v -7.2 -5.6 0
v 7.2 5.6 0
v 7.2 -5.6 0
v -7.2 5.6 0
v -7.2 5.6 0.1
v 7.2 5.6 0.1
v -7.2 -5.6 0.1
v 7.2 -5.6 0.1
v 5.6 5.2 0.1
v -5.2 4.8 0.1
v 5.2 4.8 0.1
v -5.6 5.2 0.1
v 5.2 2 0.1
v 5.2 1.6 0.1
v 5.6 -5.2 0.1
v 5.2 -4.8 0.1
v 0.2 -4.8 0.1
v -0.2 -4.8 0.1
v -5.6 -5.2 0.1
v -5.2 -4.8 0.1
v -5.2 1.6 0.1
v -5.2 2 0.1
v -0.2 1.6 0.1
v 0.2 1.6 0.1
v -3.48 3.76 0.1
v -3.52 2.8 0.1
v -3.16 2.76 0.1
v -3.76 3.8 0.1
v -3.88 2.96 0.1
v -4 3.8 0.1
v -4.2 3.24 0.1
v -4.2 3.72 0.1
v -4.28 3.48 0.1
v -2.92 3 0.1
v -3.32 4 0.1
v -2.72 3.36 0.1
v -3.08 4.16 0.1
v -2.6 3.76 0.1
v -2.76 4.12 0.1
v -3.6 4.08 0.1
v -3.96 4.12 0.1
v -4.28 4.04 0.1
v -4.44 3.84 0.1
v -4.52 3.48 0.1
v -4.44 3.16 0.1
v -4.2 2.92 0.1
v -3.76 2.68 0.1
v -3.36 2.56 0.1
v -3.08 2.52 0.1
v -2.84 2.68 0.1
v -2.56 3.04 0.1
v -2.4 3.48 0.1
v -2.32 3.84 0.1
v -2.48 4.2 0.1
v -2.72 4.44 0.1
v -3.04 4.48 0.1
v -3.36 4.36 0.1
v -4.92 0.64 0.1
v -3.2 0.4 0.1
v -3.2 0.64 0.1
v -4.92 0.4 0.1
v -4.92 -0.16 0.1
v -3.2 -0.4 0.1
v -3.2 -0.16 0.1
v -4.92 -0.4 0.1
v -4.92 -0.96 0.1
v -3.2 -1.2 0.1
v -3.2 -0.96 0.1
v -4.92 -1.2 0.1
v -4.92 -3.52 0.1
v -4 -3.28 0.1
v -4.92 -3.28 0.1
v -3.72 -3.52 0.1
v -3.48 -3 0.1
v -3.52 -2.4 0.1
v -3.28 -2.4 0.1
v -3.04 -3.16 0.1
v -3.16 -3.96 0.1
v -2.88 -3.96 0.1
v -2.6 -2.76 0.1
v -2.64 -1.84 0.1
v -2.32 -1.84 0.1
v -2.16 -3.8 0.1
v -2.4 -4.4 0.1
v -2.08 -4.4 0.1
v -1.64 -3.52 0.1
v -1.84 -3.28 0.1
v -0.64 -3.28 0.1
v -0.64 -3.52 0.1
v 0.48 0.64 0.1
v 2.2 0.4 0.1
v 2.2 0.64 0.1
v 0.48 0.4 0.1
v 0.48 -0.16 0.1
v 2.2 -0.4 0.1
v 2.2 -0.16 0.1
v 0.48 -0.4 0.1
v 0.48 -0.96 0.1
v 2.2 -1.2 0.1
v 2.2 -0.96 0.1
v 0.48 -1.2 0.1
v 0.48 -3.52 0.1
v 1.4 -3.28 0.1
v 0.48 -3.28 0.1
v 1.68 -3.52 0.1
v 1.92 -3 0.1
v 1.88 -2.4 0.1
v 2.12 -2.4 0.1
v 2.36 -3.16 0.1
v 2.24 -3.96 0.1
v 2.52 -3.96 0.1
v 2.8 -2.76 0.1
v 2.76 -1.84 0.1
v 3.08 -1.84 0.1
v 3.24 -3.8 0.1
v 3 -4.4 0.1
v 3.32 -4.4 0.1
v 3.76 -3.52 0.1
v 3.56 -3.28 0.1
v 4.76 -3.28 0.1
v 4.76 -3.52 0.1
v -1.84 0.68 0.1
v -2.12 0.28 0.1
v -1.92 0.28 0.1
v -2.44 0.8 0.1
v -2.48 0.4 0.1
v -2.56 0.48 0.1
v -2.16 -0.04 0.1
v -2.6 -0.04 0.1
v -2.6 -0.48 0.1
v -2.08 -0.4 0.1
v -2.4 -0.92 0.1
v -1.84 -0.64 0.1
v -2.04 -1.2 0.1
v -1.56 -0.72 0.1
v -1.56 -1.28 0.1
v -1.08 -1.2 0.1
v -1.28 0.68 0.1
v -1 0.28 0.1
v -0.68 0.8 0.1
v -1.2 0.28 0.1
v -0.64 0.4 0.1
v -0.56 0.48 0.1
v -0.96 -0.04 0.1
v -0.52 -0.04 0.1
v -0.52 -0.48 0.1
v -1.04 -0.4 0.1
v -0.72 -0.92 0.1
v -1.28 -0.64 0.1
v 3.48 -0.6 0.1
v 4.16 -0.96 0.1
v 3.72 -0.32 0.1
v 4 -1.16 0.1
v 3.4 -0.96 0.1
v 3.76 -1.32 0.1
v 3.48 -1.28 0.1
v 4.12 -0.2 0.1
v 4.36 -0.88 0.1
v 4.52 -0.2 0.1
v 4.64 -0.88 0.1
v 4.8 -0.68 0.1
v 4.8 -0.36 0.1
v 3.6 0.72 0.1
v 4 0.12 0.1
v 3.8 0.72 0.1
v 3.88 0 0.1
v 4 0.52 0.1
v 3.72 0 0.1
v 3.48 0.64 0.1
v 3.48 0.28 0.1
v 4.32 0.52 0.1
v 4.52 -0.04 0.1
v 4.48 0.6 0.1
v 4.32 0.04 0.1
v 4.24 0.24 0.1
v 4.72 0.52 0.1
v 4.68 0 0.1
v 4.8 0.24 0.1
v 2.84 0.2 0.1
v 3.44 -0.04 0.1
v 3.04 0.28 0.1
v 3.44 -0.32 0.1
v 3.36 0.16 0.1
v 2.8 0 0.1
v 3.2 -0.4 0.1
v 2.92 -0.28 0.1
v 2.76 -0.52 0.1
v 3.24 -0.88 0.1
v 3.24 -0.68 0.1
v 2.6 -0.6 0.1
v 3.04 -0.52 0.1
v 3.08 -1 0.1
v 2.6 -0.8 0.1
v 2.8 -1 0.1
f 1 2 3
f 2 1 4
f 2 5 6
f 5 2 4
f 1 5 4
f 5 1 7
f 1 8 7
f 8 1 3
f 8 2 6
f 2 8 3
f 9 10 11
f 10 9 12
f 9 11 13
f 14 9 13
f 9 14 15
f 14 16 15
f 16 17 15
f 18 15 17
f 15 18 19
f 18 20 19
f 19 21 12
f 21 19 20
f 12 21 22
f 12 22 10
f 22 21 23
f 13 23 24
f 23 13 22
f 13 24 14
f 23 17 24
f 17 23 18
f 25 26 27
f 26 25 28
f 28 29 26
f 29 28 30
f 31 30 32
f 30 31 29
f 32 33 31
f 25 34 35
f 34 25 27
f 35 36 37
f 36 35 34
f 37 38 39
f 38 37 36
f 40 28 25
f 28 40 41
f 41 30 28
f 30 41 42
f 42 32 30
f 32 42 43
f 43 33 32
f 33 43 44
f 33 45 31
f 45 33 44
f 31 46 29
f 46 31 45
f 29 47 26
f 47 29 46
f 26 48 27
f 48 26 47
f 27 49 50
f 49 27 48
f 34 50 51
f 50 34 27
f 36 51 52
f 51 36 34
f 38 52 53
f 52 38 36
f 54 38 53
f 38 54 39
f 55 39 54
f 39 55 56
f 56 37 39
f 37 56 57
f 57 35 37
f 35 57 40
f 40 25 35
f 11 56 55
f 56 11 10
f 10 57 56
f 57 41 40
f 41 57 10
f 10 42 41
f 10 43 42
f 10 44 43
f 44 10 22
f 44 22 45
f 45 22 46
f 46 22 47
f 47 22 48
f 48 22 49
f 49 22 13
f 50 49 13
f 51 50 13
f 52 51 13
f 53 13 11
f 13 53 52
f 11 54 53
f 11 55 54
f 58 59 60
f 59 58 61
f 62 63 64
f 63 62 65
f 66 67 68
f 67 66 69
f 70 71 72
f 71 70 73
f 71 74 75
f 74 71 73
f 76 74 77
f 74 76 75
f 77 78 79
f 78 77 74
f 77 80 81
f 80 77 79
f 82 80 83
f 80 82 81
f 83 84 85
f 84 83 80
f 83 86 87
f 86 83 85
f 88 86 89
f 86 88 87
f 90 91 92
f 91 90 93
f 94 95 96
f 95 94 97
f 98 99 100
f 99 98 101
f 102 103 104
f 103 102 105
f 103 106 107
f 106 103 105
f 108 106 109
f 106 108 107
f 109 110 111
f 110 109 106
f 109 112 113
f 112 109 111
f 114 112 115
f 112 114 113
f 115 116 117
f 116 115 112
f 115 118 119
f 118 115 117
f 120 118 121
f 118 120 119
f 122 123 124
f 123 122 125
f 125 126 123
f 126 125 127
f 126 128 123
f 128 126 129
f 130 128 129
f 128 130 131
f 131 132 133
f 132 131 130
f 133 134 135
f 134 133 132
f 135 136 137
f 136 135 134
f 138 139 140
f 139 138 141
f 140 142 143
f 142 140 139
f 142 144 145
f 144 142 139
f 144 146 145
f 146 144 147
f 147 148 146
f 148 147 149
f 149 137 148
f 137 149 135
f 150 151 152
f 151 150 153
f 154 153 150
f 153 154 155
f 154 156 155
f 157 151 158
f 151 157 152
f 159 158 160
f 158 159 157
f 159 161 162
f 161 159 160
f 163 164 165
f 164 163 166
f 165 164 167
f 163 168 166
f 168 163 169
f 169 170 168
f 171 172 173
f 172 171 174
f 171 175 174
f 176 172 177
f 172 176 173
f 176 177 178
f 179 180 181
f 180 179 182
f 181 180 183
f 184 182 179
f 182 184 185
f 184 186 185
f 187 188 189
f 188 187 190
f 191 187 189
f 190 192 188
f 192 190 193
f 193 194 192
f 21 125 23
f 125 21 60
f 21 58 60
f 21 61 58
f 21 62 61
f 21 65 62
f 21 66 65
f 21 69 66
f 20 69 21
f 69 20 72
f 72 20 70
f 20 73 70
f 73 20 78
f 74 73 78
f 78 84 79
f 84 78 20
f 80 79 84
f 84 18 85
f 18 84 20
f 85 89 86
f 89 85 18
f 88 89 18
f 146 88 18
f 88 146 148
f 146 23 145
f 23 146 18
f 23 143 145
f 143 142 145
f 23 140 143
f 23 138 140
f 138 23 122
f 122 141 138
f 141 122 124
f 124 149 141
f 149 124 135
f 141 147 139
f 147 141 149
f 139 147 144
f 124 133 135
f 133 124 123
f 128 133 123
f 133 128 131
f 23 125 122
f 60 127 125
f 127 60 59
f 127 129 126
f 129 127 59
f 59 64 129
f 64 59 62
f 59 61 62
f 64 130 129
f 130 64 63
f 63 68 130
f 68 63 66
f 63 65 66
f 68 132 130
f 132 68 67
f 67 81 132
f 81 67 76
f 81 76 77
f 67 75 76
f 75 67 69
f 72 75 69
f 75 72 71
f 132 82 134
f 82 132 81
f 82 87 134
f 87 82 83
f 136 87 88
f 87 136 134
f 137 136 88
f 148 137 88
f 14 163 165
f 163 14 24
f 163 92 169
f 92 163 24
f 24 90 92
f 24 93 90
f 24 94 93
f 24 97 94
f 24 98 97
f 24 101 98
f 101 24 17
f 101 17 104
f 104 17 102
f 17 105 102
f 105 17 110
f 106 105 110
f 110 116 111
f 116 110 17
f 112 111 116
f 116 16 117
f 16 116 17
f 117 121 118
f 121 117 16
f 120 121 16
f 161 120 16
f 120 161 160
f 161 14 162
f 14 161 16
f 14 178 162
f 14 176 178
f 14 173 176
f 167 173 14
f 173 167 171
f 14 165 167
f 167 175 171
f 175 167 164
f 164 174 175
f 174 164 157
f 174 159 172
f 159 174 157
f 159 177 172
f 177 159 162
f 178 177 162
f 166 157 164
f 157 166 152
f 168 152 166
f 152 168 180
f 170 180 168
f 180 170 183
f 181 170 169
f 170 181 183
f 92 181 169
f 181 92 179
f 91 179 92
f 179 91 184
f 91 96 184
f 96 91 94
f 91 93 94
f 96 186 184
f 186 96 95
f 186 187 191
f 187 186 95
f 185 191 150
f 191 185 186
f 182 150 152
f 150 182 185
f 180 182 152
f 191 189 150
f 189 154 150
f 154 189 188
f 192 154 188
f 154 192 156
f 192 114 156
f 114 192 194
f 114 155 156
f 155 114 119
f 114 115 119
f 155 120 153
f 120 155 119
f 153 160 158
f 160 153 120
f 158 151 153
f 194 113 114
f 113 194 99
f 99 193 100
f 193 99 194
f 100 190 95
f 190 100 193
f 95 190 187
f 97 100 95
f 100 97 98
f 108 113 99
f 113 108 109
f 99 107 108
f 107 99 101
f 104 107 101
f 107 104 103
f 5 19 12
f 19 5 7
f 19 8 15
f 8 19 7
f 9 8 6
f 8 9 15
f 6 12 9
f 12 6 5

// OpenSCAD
// file: ../p/box5-12.scad
use <../lib.scad>
function ldraw_lib__box5_12() = [
// 0 Box with 5 Faces without Any Edges
// 0 Name: box5-12.dat
// 0 Author: Chris Dee [cwdee]
// 0 !LDRAW_ORG Primitive UPDATE 2009-02
// 0 !LICENSE Licensed under CC BY 4.0 : see CAreadme.txt
// 
// 0 BFC CERTIFY CCW
  [0,"BFC","CERTIFY"],
  [0,"BFC","CCW"],
// 
// 0 !HISTORY 2009-09-03 [PTadmin] Official Update 2009-02
// 
// 
// 4 16 1 1 1 1 1 -1 -1 1 -1 -1 1 1
  [4,16,1,1,1,1,1,-1,-1,1,-1,-1,1,1],
// 4 16 -1 0 1 1 0 1 1 1 1 -1 1 1
  [4,16,-1,0,1,1,0,1,1,1,1,-1,1,1],
// 4 16 -1 0 -1 -1 0 1 -1 1 1 -1 1 -1
  [4,16,-1,0,-1,-1,0,1,-1,1,1,-1,1,-1],
// 4 16 1 0 -1 -1 0 -1 -1 1 -1 1 1 -1
  [4,16,1,0,-1,-1,0,-1,-1,1,-1,1,1,-1],
// 4 16 1 0 1 1 0 -1 1 1 -1 1 1 1
  [4,16,1,0,1,1,0,-1,1,1,-1,1,1,1],
// 0
];
module ldraw_lib__box5_12(step=0, col=false, unit=2/5, alt=false, line=0.2, solid=!$preview)
    makepoly(ldraw_lib__box5_12(), step=step, col=col, unit=unit, alt=alt, line=line, solid=solid);
ldraw_lib__box5_12(line=0.2);
// main file
use <../lib.scad>
use <../p/box5-12.scad>
function ldraw_lib__4650852l() = [
// 0 Sticker  1.4 x  1.8 with Pink Heart, Yellow Horseshoe, Paw Print and White Heart Monitor Lines on Medium Azur Background
// 0 Name: 4650852l.dat
// 0 Author: Takeshi Takahashi [RainbowDolphin]
// 0 !LDRAW_ORG Part UPDATE 2024-08
// 0 !LICENSE Licensed under CC BY 4.0 : see CAreadme.txt
// 
// 0 BFC CERTIFY CCW
  [0,"BFC","CERTIFY"],
  [0,"BFC","CCW"],
// 
// 0 !KEYWORDS Set 3188, Vet
// 
// 0 !HISTORY 2024-09-30 [OrionP] Official Update 2024-08
// 
// 
// 1 16 0 -0.25 0 18 0 0 0 0.25 0 0 0 14 box5-12.dat
  [1,16,0,-0.25,0,18,0,0,0,0.25,0,0,0,14, ldraw_lib__box5_12()],
// 4 15 -14 -0.25 13 -13 -0.25 12 13 -0.25 12 14 -0.25 13
  [4,15,-14,-0.25,13,-13,-0.25,12,13,-0.25,12,14,-0.25,13],
// 3 15 14 -0.25 13 13 -0.25 12 13 -0.25 5
  [3,15,14,-0.25,13,13,-0.25,12,13,-0.25,5],
// 4 15 14 -0.25 13 13 -0.25 5 13 -0.25 4 14 -0.25 -13
  [4,15,14,-0.25,13,13,-0.25,5,13,-0.25,4,14,-0.25,-13],
// 3 15 13 -0.25 4 13 -0.25 -12 14 -0.25 -13
  [3,15,13,-0.25,4,13,-0.25,-12,14,-0.25,-13],
// 3 15 13 -0.25 -12 0.5 -0.25 -12 14 -0.25 -13
  [3,15,13,-0.25,-12,0.5,-0.25,-12,14,-0.25,-13],
// 4 15 14 -0.25 -13 0.5 -0.25 -12 -0.5 -0.25 -12 -14 -0.25 -13
  [4,15,14,-0.25,-13,0.5,-0.25,-12,-0.5,-0.25,-12,-14,-0.25,-13],
// 3 15 -0.5 -0.25 -12 -13 -0.25 -12 -14 -0.25 -13
  [3,15,-0.5,-0.25,-12,-13,-0.25,-12,-14,-0.25,-13],
// 4 15 -14 -0.25 13 -14 -0.25 -13 -13 -0.25 -12 -13 -0.25 4
  [4,15,-14,-0.25,13,-14,-0.25,-13,-13,-0.25,-12,-13,-0.25,4],
// 3 15 -14 -0.25 13 -13 -0.25 4 -13 -0.25 5
  [3,15,-14,-0.25,13,-13,-0.25,4,-13,-0.25,5],
// 3 15 -14 -0.25 13 -13 -0.25 5 -13 -0.25 12
  [3,15,-14,-0.25,13,-13,-0.25,5,-13,-0.25,12],
// 3 15 -13 -0.25 5 -13 -0.25 4 -0.5 -0.25 4
  [3,15,-13,-0.25,5,-13,-0.25,4,-0.5,-0.25,4],
// 4 15 -13 -0.25 5 -0.5 -0.25 4 0.5 -0.25 4 13 -0.25 5
  [4,15,-13,-0.25,5,-0.5,-0.25,4,0.5,-0.25,4,13,-0.25,5],
// 3 15 13 -0.25 5 0.5 -0.25 4 13 -0.25 4
  [3,15,13,-0.25,5,0.5,-0.25,4,13,-0.25,4],
// 4 15 0.5 -0.25 4 -0.5 -0.25 4 -0.5 -0.25 -12 0.5 -0.25 -12
  [4,15,0.5,-0.25,4,-0.5,-0.25,4,-0.5,-0.25,-12,0.5,-0.25,-12],
// 4 5 -7.9 -0.25 6.9 -8.7 -0.25 9.4 -9.4 -0.25 9.5 -8.8 -0.25 7
  [4,5,-7.9,-0.25,6.9,-8.7,-0.25,9.4,-9.4,-0.25,9.5,-8.8,-0.25,7],
// 4 5 -8.8 -0.25 7 -9.4 -0.25 9.5 -10 -0.25 9.5 -9.7 -0.25 7.4
  [4,5,-8.8,-0.25,7,-9.4,-0.25,9.5,-10,-0.25,9.5,-9.7,-0.25,7.4],
// 4 5 -9.7 -0.25 7.4 -10 -0.25 9.5 -10.5 -0.25 9.3 -10.5 -0.25 8.1
  [4,5,-9.7,-0.25,7.4,-10,-0.25,9.5,-10.5,-0.25,9.3,-10.5,-0.25,8.1],
// 3 5 -10.5 -0.25 9.3 -10.7 -0.25 8.7 -10.5 -0.25 8.1
  [3,5,-10.5,-0.25,9.3,-10.7,-0.25,8.7,-10.5,-0.25,8.1],
// 4 5 -8.7 -0.25 9.4 -7.9 -0.25 6.9 -7.3 -0.25 7.5 -8.3 -0.25 10
  [4,5,-8.7,-0.25,9.4,-7.9,-0.25,6.9,-7.3,-0.25,7.5,-8.3,-0.25,10],
// 4 5 -8.3 -0.25 10 -7.3 -0.25 7.5 -6.8 -0.25 8.4 -7.7 -0.25 10.4
  [4,5,-8.3,-0.25,10,-7.3,-0.25,7.5,-6.8,-0.25,8.4,-7.7,-0.25,10.4],
// 4 5 -7.7 -0.25 10.4 -6.8 -0.25 8.4 -6.5 -0.25 9.4 -6.9 -0.25 10.3
  [4,5,-7.7,-0.25,10.4,-6.8,-0.25,8.4,-6.5,-0.25,9.4,-6.9,-0.25,10.3],
// 4 15 -9.4 -0.25 9.5 -8.7 -0.25 9.4 -9 -0.25 10.2 -9.9 -0.25 10.3
  [4,15,-9.4,-0.25,9.5,-8.7,-0.25,9.4,-9,-0.25,10.2,-9.9,-0.25,10.3],
// 4 15 -10 -0.25 9.5 -9.4 -0.25 9.5 -9.9 -0.25 10.3 -10.7 -0.25 10.1
  [4,15,-10,-0.25,9.5,-9.4,-0.25,9.5,-9.9,-0.25,10.3,-10.7,-0.25,10.1],
// 4 15 -10.5 -0.25 9.3 -10 -0.25 9.5 -10.7 -0.25 10.1 -11.1 -0.25 9.6
  [4,15,-10.5,-0.25,9.3,-10,-0.25,9.5,-10.7,-0.25,10.1,-11.1,-0.25,9.6],
// 4 15 -10.7 -0.25 8.7 -10.5 -0.25 9.3 -11.1 -0.25 9.6 -11.3 -0.25 8.7
  [4,15,-10.7,-0.25,8.7,-10.5,-0.25,9.3,-11.1,-0.25,9.6,-11.3,-0.25,8.7],
// 4 15 -10.7 -0.25 8.7 -11.3 -0.25 8.7 -11.1 -0.25 7.9 -10.5 -0.25 8.1
  [4,15,-10.7,-0.25,8.7,-11.3,-0.25,8.7,-11.1,-0.25,7.9,-10.5,-0.25,8.1],
// 4 15 -10.5 -0.25 8.1 -11.1 -0.25 7.9 -10.5 -0.25 7.3 -9.7 -0.25 7.4
  [4,15,-10.5,-0.25,8.1,-11.1,-0.25,7.9,-10.5,-0.25,7.3,-9.7,-0.25,7.4],
// 4 15 -9.7 -0.25 7.4 -10.5 -0.25 7.3 -9.4 -0.25 6.7 -8.8 -0.25 7
  [4,15,-9.7,-0.25,7.4,-10.5,-0.25,7.3,-9.4,-0.25,6.7,-8.8,-0.25,7],
// 4 15 -8.8 -0.25 7 -9.4 -0.25 6.7 -8.4 -0.25 6.4 -7.9 -0.25 6.9
  [4,15,-8.8,-0.25,7,-9.4,-0.25,6.7,-8.4,-0.25,6.4,-7.9,-0.25,6.9],
// 4 15 -7.9 -0.25 6.9 -8.4 -0.25 6.4 -7.7 -0.25 6.3 -7.1 -0.25 6.7
  [4,15,-7.9,-0.25,6.9,-8.4,-0.25,6.4,-7.7,-0.25,6.3,-7.1,-0.25,6.7],
// 4 15 -7.3 -0.25 7.5 -7.9 -0.25 6.9 -7.1 -0.25 6.7 -6.4 -0.25 7.6
  [4,15,-7.3,-0.25,7.5,-7.9,-0.25,6.9,-7.1,-0.25,6.7,-6.4,-0.25,7.6],
// 4 15 -6.8 -0.25 8.4 -7.3 -0.25 7.5 -6.4 -0.25 7.6 -6 -0.25 8.7
  [4,15,-6.8,-0.25,8.4,-7.3,-0.25,7.5,-6.4,-0.25,7.6,-6,-0.25,8.7],
// 4 15 -6.5 -0.25 9.4 -6.8 -0.25 8.4 -6 -0.25 8.7 -5.8 -0.25 9.6
  [4,15,-6.5,-0.25,9.4,-6.8,-0.25,8.4,-6,-0.25,8.7,-5.8,-0.25,9.6],
// 4 15 -6.5 -0.25 9.4 -5.8 -0.25 9.6 -6.2 -0.25 10.5 -6.9 -0.25 10.3
  [4,15,-6.5,-0.25,9.4,-5.8,-0.25,9.6,-6.2,-0.25,10.5,-6.9,-0.25,10.3],
// 4 15 -6.9 -0.25 10.3 -6.2 -0.25 10.5 -6.8 -0.25 11.1 -7.6 -0.25 11.2
  [4,15,-6.9,-0.25,10.3,-6.2,-0.25,10.5,-6.8,-0.25,11.1,-7.6,-0.25,11.2],
// 4 15 -7.7 -0.25 10.4 -6.9 -0.25 10.3 -7.6 -0.25 11.2 -8.4 -0.25 10.9
  [4,15,-7.7,-0.25,10.4,-6.9,-0.25,10.3,-7.6,-0.25,11.2,-8.4,-0.25,10.9],
// 4 15 -8.3 -0.25 10 -7.7 -0.25 10.4 -8.4 -0.25 10.9 -9 -0.25 10.2
  [4,15,-8.3,-0.25,10,-7.7,-0.25,10.4,-8.4,-0.25,10.9,-9,-0.25,10.2],
// 3 15 -9 -0.25 10.2 -8.7 -0.25 9.4 -8.3 -0.25 10
  [3,15,-9,-0.25,10.2,-8.7,-0.25,9.4,-8.3,-0.25,10],
// 4 27 13 -0.25 12 -13 -0.25 12 -7.6 -0.25 11.2 -6.8 -0.25 11.1
  [4,27,13,-0.25,12,-13,-0.25,12,-7.6,-0.25,11.2,-6.8,-0.25,11.1],
// 3 27 -13 -0.25 12 -8.4 -0.25 10.9 -7.6 -0.25 11.2
  [3,27,-13,-0.25,12,-8.4,-0.25,10.9,-7.6,-0.25,11.2],
// 4 27 -9 -0.25 10.2 -8.4 -0.25 10.9 -13 -0.25 12 -9.9 -0.25 10.3
  [4,27,-9,-0.25,10.2,-8.4,-0.25,10.9,-13,-0.25,12,-9.9,-0.25,10.3],
// 3 27 -13 -0.25 12 -10.7 -0.25 10.1 -9.9 -0.25 10.3
  [3,27,-13,-0.25,12,-10.7,-0.25,10.1,-9.9,-0.25,10.3],
// 3 27 -13 -0.25 12 -11.1 -0.25 9.6 -10.7 -0.25 10.1
  [3,27,-13,-0.25,12,-11.1,-0.25,9.6,-10.7,-0.25,10.1],
// 4 27 -11.3 -0.25 8.7 -11.1 -0.25 9.6 -13 -0.25 12 -13 -0.25 5
  [4,27,-11.3,-0.25,8.7,-11.1,-0.25,9.6,-13,-0.25,12,-13,-0.25,5],
// 3 27 -11.3 -0.25 8.7 -13 -0.25 5 -11.1 -0.25 7.9
  [3,27,-11.3,-0.25,8.7,-13,-0.25,5,-11.1,-0.25,7.9],
// 3 27 -11.1 -0.25 7.9 -13 -0.25 5 -10.5 -0.25 7.3
  [3,27,-11.1,-0.25,7.9,-13,-0.25,5,-10.5,-0.25,7.3],
// 3 27 -10.5 -0.25 7.3 -13 -0.25 5 -9.4 -0.25 6.7
  [3,27,-10.5,-0.25,7.3,-13,-0.25,5,-9.4,-0.25,6.7],
// 3 27 -9.4 -0.25 6.7 -13 -0.25 5 -8.4 -0.25 6.4
  [3,27,-9.4,-0.25,6.7,-13,-0.25,5,-8.4,-0.25,6.4],
// 3 27 -8.4 -0.25 6.4 -13 -0.25 5 -7.7 -0.25 6.3
  [3,27,-8.4,-0.25,6.4,-13,-0.25,5,-7.7,-0.25,6.3],
// 3 27 -7.7 -0.25 6.3 -13 -0.25 5 13 -0.25 5
  [3,27,-7.7,-0.25,6.3,-13,-0.25,5,13,-0.25,5],
// 3 27 -7.1 -0.25 6.7 -7.7 -0.25 6.3 13 -0.25 5
  [3,27,-7.1,-0.25,6.7,-7.7,-0.25,6.3,13,-0.25,5],
// 3 27 -6.4 -0.25 7.6 -7.1 -0.25 6.7 13 -0.25 5
  [3,27,-6.4,-0.25,7.6,-7.1,-0.25,6.7,13,-0.25,5],
// 3 27 -6 -0.25 8.7 -6.4 -0.25 7.6 13 -0.25 5
  [3,27,-6,-0.25,8.7,-6.4,-0.25,7.6,13,-0.25,5],
// 4 27 -5.8 -0.25 9.6 -6 -0.25 8.7 13 -0.25 5 13 -0.25 12
  [4,27,-5.8,-0.25,9.6,-6,-0.25,8.7,13,-0.25,5,13,-0.25,12],
// 3 27 13 -0.25 12 -6.2 -0.25 10.5 -5.8 -0.25 9.6
  [3,27,13,-0.25,12,-6.2,-0.25,10.5,-5.8,-0.25,9.6],
// 3 27 13 -0.25 12 -6.8 -0.25 11.1 -6.2 -0.25 10.5
  [3,27,13,-0.25,12,-6.8,-0.25,11.1,-6.2,-0.25,10.5],
// 4 15 -12.3 -0.25 1 -8 -0.25 1 -8 -0.25 1.6 -12.3 -0.25 1.6
  [4,15,-12.3,-0.25,1,-8,-0.25,1,-8,-0.25,1.6,-12.3,-0.25,1.6],
// 4 15 -12.3 -0.25 -1 -8 -0.25 -1 -8 -0.25 -0.4 -12.3 -0.25 -0.4
  [4,15,-12.3,-0.25,-1,-8,-0.25,-1,-8,-0.25,-0.4,-12.3,-0.25,-0.4],
// 4 15 -12.3 -0.25 -3 -8 -0.25 -3 -8 -0.25 -2.4 -12.3 -0.25 -2.4
  [4,15,-12.3,-0.25,-3,-8,-0.25,-3,-8,-0.25,-2.4,-12.3,-0.25,-2.4],
// 4 15 -10 -0.25 -8.2 -12.3 -0.25 -8.2 -12.3 -0.25 -8.8 -9.3 -0.25 -8.8
  [4,15,-10,-0.25,-8.2,-12.3,-0.25,-8.2,-12.3,-0.25,-8.8,-9.3,-0.25,-8.8],
// 4 15 -10 -0.25 -8.2 -9.3 -0.25 -8.8 -8.7 -0.25 -7.5 -8.8 -0.25 -6
  [4,15,-10,-0.25,-8.2,-9.3,-0.25,-8.8,-8.7,-0.25,-7.5,-8.8,-0.25,-6],
// 4 15 -8.2 -0.25 -6 -8.8 -0.25 -6 -8.7 -0.25 -7.5 -7.6 -0.25 -7.9
  [4,15,-8.2,-0.25,-6,-8.8,-0.25,-6,-8.7,-0.25,-7.5,-7.6,-0.25,-7.9],
// 4 15 -7.6 -0.25 -7.9 -8.7 -0.25 -7.5 -7.9 -0.25 -9.9 -7.2 -0.25 -9.9
  [4,15,-7.6,-0.25,-7.9,-8.7,-0.25,-7.5,-7.9,-0.25,-9.9,-7.2,-0.25,-9.9],
// 4 15 -7.6 -0.25 -7.9 -7.2 -0.25 -9.9 -6.5 -0.25 -6.9 -6.6 -0.25 -4.6
  [4,15,-7.6,-0.25,-7.9,-7.2,-0.25,-9.9,-6.5,-0.25,-6.9,-6.6,-0.25,-4.6],
// 4 15 -5.8 -0.25 -4.6 -6.6 -0.25 -4.6 -6.5 -0.25 -6.9 -5.4 -0.25 -9.5
  [4,15,-5.8,-0.25,-4.6,-6.6,-0.25,-4.6,-6.5,-0.25,-6.9,-5.4,-0.25,-9.5],
// 4 15 -5.4 -0.25 -9.5 -6.5 -0.25 -6.9 -6 -0.25 -11 -5.2 -0.25 -11
  [4,15,-5.4,-0.25,-9.5,-6.5,-0.25,-6.9,-6,-0.25,-11,-5.2,-0.25,-11],
// 4 15 -5.4 -0.25 -9.5 -5.2 -0.25 -11 -4.1 -0.25 -8.8 -4.6 -0.25 -8.2
  [4,15,-5.4,-0.25,-9.5,-5.2,-0.25,-11,-4.1,-0.25,-8.8,-4.6,-0.25,-8.2],
// 4 15 -1.6 -0.25 -8.2 -4.6 -0.25 -8.2 -4.1 -0.25 -8.8 -1.6 -0.25 -8.8
  [4,15,-1.6,-0.25,-8.2,-4.6,-0.25,-8.2,-4.1,-0.25,-8.8,-1.6,-0.25,-8.8],
// 4 15 1.2 -0.25 1 5.5 -0.25 1 5.5 -0.25 1.6 1.2 -0.25 1.6
  [4,15,1.2,-0.25,1,5.5,-0.25,1,5.5,-0.25,1.6,1.2,-0.25,1.6],
// 4 15 1.2 -0.25 -1 5.5 -0.25 -1 5.5 -0.25 -0.4 1.2 -0.25 -0.4
  [4,15,1.2,-0.25,-1,5.5,-0.25,-1,5.5,-0.25,-0.4,1.2,-0.25,-0.4],
// 4 15 1.2 -0.25 -3 5.5 -0.25 -3 5.5 -0.25 -2.4 1.2 -0.25 -2.4
  [4,15,1.2,-0.25,-3,5.5,-0.25,-3,5.5,-0.25,-2.4,1.2,-0.25,-2.4],
// 4 15 3.5 -0.25 -8.2 1.2 -0.25 -8.2 1.2 -0.25 -8.8 4.2 -0.25 -8.8
  [4,15,3.5,-0.25,-8.2,1.2,-0.25,-8.2,1.2,-0.25,-8.8,4.2,-0.25,-8.8],
// 4 15 3.5 -0.25 -8.2 4.2 -0.25 -8.8 4.8 -0.25 -7.5 4.7 -0.25 -6
  [4,15,3.5,-0.25,-8.2,4.2,-0.25,-8.8,4.8,-0.25,-7.5,4.7,-0.25,-6],
// 4 15 5.3 -0.25 -6 4.7 -0.25 -6 4.8 -0.25 -7.5 5.9 -0.25 -7.9
  [4,15,5.3,-0.25,-6,4.7,-0.25,-6,4.8,-0.25,-7.5,5.9,-0.25,-7.9],
// 4 15 5.9 -0.25 -7.9 4.8 -0.25 -7.5 5.6 -0.25 -9.9 6.3 -0.25 -9.9
  [4,15,5.9,-0.25,-7.9,4.8,-0.25,-7.5,5.6,-0.25,-9.9,6.3,-0.25,-9.9],
// 4 15 5.9 -0.25 -7.9 6.3 -0.25 -9.9 7 -0.25 -6.9 6.9 -0.25 -4.6
  [4,15,5.9,-0.25,-7.9,6.3,-0.25,-9.9,7,-0.25,-6.9,6.9,-0.25,-4.6],
// 4 15 7.7 -0.25 -4.6 6.9 -0.25 -4.6 7 -0.25 -6.9 8.1 -0.25 -9.5
  [4,15,7.7,-0.25,-4.6,6.9,-0.25,-4.6,7,-0.25,-6.9,8.1,-0.25,-9.5],
// 4 15 8.1 -0.25 -9.5 7 -0.25 -6.9 7.5 -0.25 -11 8.3 -0.25 -11
  [4,15,8.1,-0.25,-9.5,7,-0.25,-6.9,7.5,-0.25,-11,8.3,-0.25,-11],
// 4 15 8.1 -0.25 -9.5 8.3 -0.25 -11 9.4 -0.25 -8.8 8.9 -0.25 -8.2
  [4,15,8.1,-0.25,-9.5,8.3,-0.25,-11,9.4,-0.25,-8.8,8.9,-0.25,-8.2],
// 4 15 11.9 -0.25 -8.2 8.9 -0.25 -8.2 9.4 -0.25 -8.8 11.9 -0.25 -8.8
  [4,15,11.9,-0.25,-8.2,8.9,-0.25,-8.2,9.4,-0.25,-8.8,11.9,-0.25,-8.8],
// 4 14 -4.8 -0.25 0.7 -4.6 -0.25 1.7 -6.1 -0.25 2 -5.3 -0.25 0.7
  [4,14,-4.8,-0.25,0.7,-4.6,-0.25,1.7,-6.1,-0.25,2,-5.3,-0.25,0.7],
// 4 14 -6.2 -0.25 1 -5.3 -0.25 0.7 -6.1 -0.25 2 -6.4 -0.25 1.2
  [4,14,-6.2,-0.25,1,-5.3,-0.25,0.7,-6.1,-0.25,2,-6.4,-0.25,1.2],
// 4 14 -5.4 -0.25 -0.1 -5.3 -0.25 0.7 -6.2 -0.25 1 -6.5 -0.25 -0.1
  [4,14,-5.4,-0.25,-0.1,-5.3,-0.25,0.7,-6.2,-0.25,1,-6.5,-0.25,-0.1],
// 4 14 -5.4 -0.25 -0.1 -6.5 -0.25 -0.1 -6.5 -0.25 -1.2 -5.2 -0.25 -1
  [4,14,-5.4,-0.25,-0.1,-6.5,-0.25,-0.1,-6.5,-0.25,-1.2,-5.2,-0.25,-1],
// 4 14 -5.2 -0.25 -1 -6.5 -0.25 -1.2 -6 -0.25 -2.3 -4.6 -0.25 -1.6
  [4,14,-5.2,-0.25,-1,-6.5,-0.25,-1.2,-6,-0.25,-2.3,-4.6,-0.25,-1.6],
// 4 14 -4.6 -0.25 -1.6 -6 -0.25 -2.3 -5.1 -0.25 -3 -3.9 -0.25 -1.8
  [4,14,-4.6,-0.25,-1.6,-6,-0.25,-2.3,-5.1,-0.25,-3,-3.9,-0.25,-1.8],
// 4 14 -3.9 -0.25 -1.8 -5.1 -0.25 -3 -3.9 -0.25 -3.2 -2.7 -0.25 -3
  [4,14,-3.9,-0.25,-1.8,-5.1,-0.25,-3,-3.9,-0.25,-3.2,-2.7,-0.25,-3],
// 4 14 -1.7 -0.25 2 -3.2 -0.25 1.7 -3 -0.25 0.7 -2.5 -0.25 0.7
  [4,14,-1.7,-0.25,2,-3.2,-0.25,1.7,-3,-0.25,0.7,-2.5,-0.25,0.7],
// 4 14 -1.7 -0.25 2 -2.5 -0.25 0.7 -1.6 -0.25 1 -1.4 -0.25 1.2
  [4,14,-1.7,-0.25,2,-2.5,-0.25,0.7,-1.6,-0.25,1,-1.4,-0.25,1.2],
// 4 14 -1.6 -0.25 1 -2.5 -0.25 0.7 -2.4 -0.25 -0.1 -1.3 -0.25 -0.1
  [4,14,-1.6,-0.25,1,-2.5,-0.25,0.7,-2.4,-0.25,-0.1,-1.3,-0.25,-0.1],
// 4 14 -1.3 -0.25 -1.2 -1.3 -0.25 -0.1 -2.4 -0.25 -0.1 -2.6 -0.25 -1
  [4,14,-1.3,-0.25,-1.2,-1.3,-0.25,-0.1,-2.4,-0.25,-0.1,-2.6,-0.25,-1],
// 4 14 -1.8 -0.25 -2.3 -1.3 -0.25 -1.2 -2.6 -0.25 -1 -3.2 -0.25 -1.6
  [4,14,-1.8,-0.25,-2.3,-1.3,-0.25,-1.2,-2.6,-0.25,-1,-3.2,-0.25,-1.6],
// 4 14 -2.7 -0.25 -3 -1.8 -0.25 -2.3 -3.2 -0.25 -1.6 -3.9 -0.25 -1.8
  [4,14,-2.7,-0.25,-3,-1.8,-0.25,-2.3,-3.2,-0.25,-1.6,-3.9,-0.25,-1.8],
// 4 14 10.4 -0.25 -2.4 9.3 -0.25 -0.8 8.7 -0.25 -1.5 10 -0.25 -2.9
  [4,14,10.4,-0.25,-2.4,9.3,-0.25,-0.8,8.7,-0.25,-1.5,10,-0.25,-2.9],
// 4 14 10 -0.25 -2.9 8.7 -0.25 -1.5 8.5 -0.25 -2.4 9.4 -0.25 -3.3
  [4,14,10,-0.25,-2.9,8.7,-0.25,-1.5,8.5,-0.25,-2.4,9.4,-0.25,-3.3],
// 3 14 8.5 -0.25 -2.4 8.7 -0.25 -3.2 9.4 -0.25 -3.3
  [3,14,8.5,-0.25,-2.4,8.7,-0.25,-3.2,9.4,-0.25,-3.3],
// 4 14 9.3 -0.25 -0.8 10.4 -0.25 -2.4 10.9 -0.25 -2.2 10.3 -0.25 -0.5
  [4,14,9.3,-0.25,-0.8,10.4,-0.25,-2.4,10.9,-0.25,-2.2,10.3,-0.25,-0.5],
// 4 14 10.3 -0.25 -0.5 10.9 -0.25 -2.2 11.6 -0.25 -2.2 11.3 -0.25 -0.5
  [4,14,10.3,-0.25,-0.5,10.9,-0.25,-2.2,11.6,-0.25,-2.2,11.3,-0.25,-0.5],
// 4 14 11.3 -0.25 -0.5 11.6 -0.25 -2.2 12 -0.25 -1.7 12 -0.25 -0.9
  [4,14,11.3,-0.25,-0.5,11.6,-0.25,-2.2,12,-0.25,-1.7,12,-0.25,-0.9],
// 4 14 9 -0.25 1.8 9.7 -0.25 0 10 -0.25 0.3 9.5 -0.25 1.8
  [4,14,9,-0.25,1.8,9.7,-0.25,0,10,-0.25,0.3,9.5,-0.25,1.8],
// 3 14 9.5 -0.25 1.8 10 -0.25 0.3 10 -0.25 1.3
  [3,14,9.5,-0.25,1.8,10,-0.25,0.3,10,-0.25,1.3],
// 4 14 9.7 -0.25 0 9 -0.25 1.8 8.7 -0.25 1.6 9.3 -0.25 0
  [4,14,9.7,-0.25,0,9,-0.25,1.8,8.7,-0.25,1.6,9.3,-0.25,0],
// 3 14 8.7 -0.25 1.6 8.7 -0.25 0.7 9.3 -0.25 0
  [3,14,8.7,-0.25,1.6,8.7,-0.25,0.7,9.3,-0.25,0],
// 4 14 11.3 -0.25 -0.1 11.2 -0.25 1.5 10.8 -0.25 1.3 10.8 -0.25 0.1
  [4,14,11.3,-0.25,-0.1,11.2,-0.25,1.5,10.8,-0.25,1.3,10.8,-0.25,0.1],
// 3 14 10.8 -0.25 1.3 10.6 -0.25 0.6 10.8 -0.25 0.1
  [3,14,10.8,-0.25,1.3,10.6,-0.25,0.6,10.8,-0.25,0.1],
// 4 14 11.2 -0.25 1.5 11.3 -0.25 -0.1 11.7 -0.25 0 11.8 -0.25 1.3
  [4,14,11.2,-0.25,1.5,11.3,-0.25,-0.1,11.7,-0.25,0,11.8,-0.25,1.3],
// 3 14 11.8 -0.25 1.3 11.7 -0.25 0 12 -0.25 0.6
  [3,14,11.8,-0.25,1.3,11.7,-0.25,0,12,-0.25,0.6],
// 4 14 7.6 -0.25 0.7 7.1 -0.25 0.5 8.6 -0.25 -0.8 8.6 -0.25 -0.1
  [4,14,7.6,-0.25,0.7,7.1,-0.25,0.5,8.6,-0.25,-0.8,8.6,-0.25,-0.1],
// 3 14 7.6 -0.25 0.7 8.6 -0.25 -0.1 8.4 -0.25 0.4
  [3,14,7.6,-0.25,0.7,8.6,-0.25,-0.1,8.4,-0.25,0.4],
// 4 14 8.6 -0.25 -0.8 7.1 -0.25 0.5 7 -0.25 0 8 -0.25 -1
  [4,14,8.6,-0.25,-0.8,7.1,-0.25,0.5,7,-0.25,0,8,-0.25,-1],
// 3 14 7 -0.25 0 7.3 -0.25 -0.7 8 -0.25 -1
  [3,14,7,-0.25,0,7.3,-0.25,-0.7,8,-0.25,-1],
// 4 14 6.9 -0.25 -1.3 6.5 -0.25 -1.5 8.1 -0.25 -2.2 8.1 -0.25 -1.7
  [4,14,6.9,-0.25,-1.3,6.5,-0.25,-1.5,8.1,-0.25,-2.2,8.1,-0.25,-1.7],
// 3 14 7.6 -0.25 -1.3 6.9 -0.25 -1.3 8.1 -0.25 -1.7
  [3,14,7.6,-0.25,-1.3,6.9,-0.25,-1.3,8.1,-0.25,-1.7],
// 4 14 8.1 -0.25 -2.2 6.5 -0.25 -1.5 6.5 -0.25 -2 7.7 -0.25 -2.5
  [4,14,8.1,-0.25,-2.2,6.5,-0.25,-1.5,6.5,-0.25,-2,7.7,-0.25,-2.5],
// 3 14 6.5 -0.25 -2 7 -0.25 -2.5 7.7 -0.25 -2.5
  [3,14,6.5,-0.25,-2,7,-0.25,-2.5,7.7,-0.25,-2.5],
// 4 322 -6.1 -0.25 2 -0.5 -0.25 4 -13 -0.25 4 -8 -0.25 1.6
  [4,322,-6.1,-0.25,2,-0.5,-0.25,4,-13,-0.25,4,-8,-0.25,1.6],
// 3 322 -13 -0.25 4 -12.3 -0.25 1.6 -8 -0.25 1.6
  [3,322,-13,-0.25,4,-12.3,-0.25,1.6,-8,-0.25,1.6],
// 3 322 -13 -0.25 4 -12.3 -0.25 1 -12.3 -0.25 1.6
  [3,322,-13,-0.25,4,-12.3,-0.25,1,-12.3,-0.25,1.6],
// 3 322 -13 -0.25 4 -12.3 -0.25 -0.4 -12.3 -0.25 1
  [3,322,-13,-0.25,4,-12.3,-0.25,-0.4,-12.3,-0.25,1],
// 3 322 -13 -0.25 4 -12.3 -0.25 -1 -12.3 -0.25 -0.4
  [3,322,-13,-0.25,4,-12.3,-0.25,-1,-12.3,-0.25,-0.4],
// 3 322 -13 -0.25 4 -12.3 -0.25 -2.4 -12.3 -0.25 -1
  [3,322,-13,-0.25,4,-12.3,-0.25,-2.4,-12.3,-0.25,-1],
// 3 322 -13 -0.25 4 -12.3 -0.25 -3 -12.3 -0.25 -2.4
  [3,322,-13,-0.25,4,-12.3,-0.25,-3,-12.3,-0.25,-2.4],
// 4 322 -12.3 -0.25 -8.2 -12.3 -0.25 -3 -13 -0.25 4 -13 -0.25 -12
  [4,322,-12.3,-0.25,-8.2,-12.3,-0.25,-3,-13,-0.25,4,-13,-0.25,-12],
// 3 322 -12.3 -0.25 -8.2 -13 -0.25 -12 -12.3 -0.25 -8.8
  [3,322,-12.3,-0.25,-8.2,-13,-0.25,-12,-12.3,-0.25,-8.8],
// 4 322 -9.3 -0.25 -8.8 -12.3 -0.25 -8.8 -13 -0.25 -12 -7.9 -0.25 -9.9
  [4,322,-9.3,-0.25,-8.8,-12.3,-0.25,-8.8,-13,-0.25,-12,-7.9,-0.25,-9.9],
// 3 322 -8.7 -0.25 -7.5 -9.3 -0.25 -8.8 -7.9 -0.25 -9.9
  [3,322,-8.7,-0.25,-7.5,-9.3,-0.25,-8.8,-7.9,-0.25,-9.9],
// 4 322 -7.2 -0.25 -9.9 -7.9 -0.25 -9.9 -13 -0.25 -12 -6 -0.25 -11
  [4,322,-7.2,-0.25,-9.9,-7.9,-0.25,-9.9,-13,-0.25,-12,-6,-0.25,-11],
// 3 322 -6.5 -0.25 -6.9 -7.2 -0.25 -9.9 -6 -0.25 -11
  [3,322,-6.5,-0.25,-6.9,-7.2,-0.25,-9.9,-6,-0.25,-11],
// 4 322 -6 -0.25 -11 -13 -0.25 -12 -0.5 -0.25 -12 -5.2 -0.25 -11
  [4,322,-6,-0.25,-11,-13,-0.25,-12,-0.5,-0.25,-12,-5.2,-0.25,-11],
// 4 322 -4.1 -0.25 -8.8 -5.2 -0.25 -11 -0.5 -0.25 -12 -1.6 -0.25 -8.8
  [4,322,-4.1,-0.25,-8.8,-5.2,-0.25,-11,-0.5,-0.25,-12,-1.6,-0.25,-8.8],
// 3 322 -1.6 -0.25 -8.2 -1.6 -0.25 -8.8 -0.5 -0.25 -12
  [3,322,-1.6,-0.25,-8.2,-1.6,-0.25,-8.8,-0.5,-0.25,-12],
// 4 322 -1.8 -0.25 -2.3 -1.6 -0.25 -8.2 -0.5 -0.25 -12 -1.3 -0.25 -1.2
  [4,322,-1.8,-0.25,-2.3,-1.6,-0.25,-8.2,-0.5,-0.25,-12,-1.3,-0.25,-1.2],
// 4 322 -1.3 -0.25 -1.2 -0.5 -0.25 -12 -0.5 -0.25 4 -1.3 -0.25 -0.1
  [4,322,-1.3,-0.25,-1.2,-0.5,-0.25,-12,-0.5,-0.25,4,-1.3,-0.25,-0.1],
// 3 322 -0.5 -0.25 4 -1.4 -0.25 1.2 -1.3 -0.25 -0.1
  [3,322,-0.5,-0.25,4,-1.4,-0.25,1.2,-1.3,-0.25,-0.1],
// 3 322 -1.4 -0.25 1.2 -1.6 -0.25 1 -1.3 -0.25 -0.1
  [3,322,-1.4,-0.25,1.2,-1.6,-0.25,1,-1.3,-0.25,-0.1],
// 3 322 -0.5 -0.25 4 -1.7 -0.25 2 -1.4 -0.25 1.2
  [3,322,-0.5,-0.25,4,-1.7,-0.25,2,-1.4,-0.25,1.2],
// 4 322 -3.2 -0.25 1.7 -1.7 -0.25 2 -0.5 -0.25 4 -4.6 -0.25 1.7
  [4,322,-3.2,-0.25,1.7,-1.7,-0.25,2,-0.5,-0.25,4,-4.6,-0.25,1.7],
// 4 322 -3 -0.25 0.7 -3.2 -0.25 1.7 -4.6 -0.25 1.7 -4.8 -0.25 0.7
  [4,322,-3,-0.25,0.7,-3.2,-0.25,1.7,-4.6,-0.25,1.7,-4.8,-0.25,0.7],
// 4 322 -3 -0.25 0.7 -4.8 -0.25 0.7 -3.9 -0.25 -1.8 -3.2 -0.25 -1.6
  [4,322,-3,-0.25,0.7,-4.8,-0.25,0.7,-3.9,-0.25,-1.8,-3.2,-0.25,-1.6],
// 4 322 -2.5 -0.25 0.7 -3 -0.25 0.7 -3.2 -0.25 -1.6 -2.6 -0.25 -1
  [4,322,-2.5,-0.25,0.7,-3,-0.25,0.7,-3.2,-0.25,-1.6,-2.6,-0.25,-1],
// 3 322 -2.5 -0.25 0.7 -2.6 -0.25 -1 -2.4 -0.25 -0.1
  [3,322,-2.5,-0.25,0.7,-2.6,-0.25,-1,-2.4,-0.25,-0.1],
// 4 322 -4.6 -0.25 -1.6 -3.9 -0.25 -1.8 -4.8 -0.25 0.7 -5.3 -0.25 0.7
  [4,322,-4.6,-0.25,-1.6,-3.9,-0.25,-1.8,-4.8,-0.25,0.7,-5.3,-0.25,0.7],
// 4 322 -5.2 -0.25 -1 -4.6 -0.25 -1.6 -5.3 -0.25 0.7 -5.4 -0.25 -0.1
  [4,322,-5.2,-0.25,-1,-4.6,-0.25,-1.6,-5.3,-0.25,0.7,-5.4,-0.25,-0.1],
// 3 322 -0.5 -0.25 4 -6.1 -0.25 2 -4.6 -0.25 1.7
  [3,322,-0.5,-0.25,4,-6.1,-0.25,2,-4.6,-0.25,1.7],
// 4 322 -6.4 -0.25 1.2 -6.1 -0.25 2 -8 -0.25 1.6 -8 -0.25 1
  [4,322,-6.4,-0.25,1.2,-6.1,-0.25,2,-8,-0.25,1.6,-8,-0.25,1],
// 4 322 -6.2 -0.25 1 -6.4 -0.25 1.2 -8 -0.25 1 -6.5 -0.25 -0.1
  [4,322,-6.2,-0.25,1,-6.4,-0.25,1.2,-8,-0.25,1,-6.5,-0.25,-0.1],
// 4 322 -8 -0.25 -0.4 -6.5 -0.25 -0.1 -8 -0.25 1 -12.3 -0.25 -0.4
  [4,322,-8,-0.25,-0.4,-6.5,-0.25,-0.1,-8,-0.25,1,-12.3,-0.25,-0.4],
// 3 322 -8 -0.25 1 -12.3 -0.25 1 -12.3 -0.25 -0.4
  [3,322,-8,-0.25,1,-12.3,-0.25,1,-12.3,-0.25,-0.4],
// 4 322 -6.5 -0.25 -0.1 -8 -0.25 -0.4 -8 -0.25 -1 -6.5 -0.25 -1.2
  [4,322,-6.5,-0.25,-0.1,-8,-0.25,-0.4,-8,-0.25,-1,-6.5,-0.25,-1.2],
// 4 322 -8 -0.25 -2.4 -6.5 -0.25 -1.2 -8 -0.25 -1 -12.3 -0.25 -2.4
  [4,322,-8,-0.25,-2.4,-6.5,-0.25,-1.2,-8,-0.25,-1,-12.3,-0.25,-2.4],
// 3 322 -8 -0.25 -1 -12.3 -0.25 -1 -12.3 -0.25 -2.4
  [3,322,-8,-0.25,-1,-12.3,-0.25,-1,-12.3,-0.25,-2.4],
// 4 322 -6 -0.25 -2.3 -6.5 -0.25 -1.2 -8 -0.25 -2.4 -8 -0.25 -3
  [4,322,-6,-0.25,-2.3,-6.5,-0.25,-1.2,-8,-0.25,-2.4,-8,-0.25,-3],
// 4 322 -6.6 -0.25 -4.6 -6 -0.25 -2.3 -8 -0.25 -3 -8.2 -0.25 -6
  [4,322,-6.6,-0.25,-4.6,-6,-0.25,-2.3,-8,-0.25,-3,-8.2,-0.25,-6],
// 3 322 -6.6 -0.25 -4.6 -8.2 -0.25 -6 -7.6 -0.25 -7.9
  [3,322,-6.6,-0.25,-4.6,-8.2,-0.25,-6,-7.6,-0.25,-7.9],
// 4 322 -8.8 -0.25 -6 -8.2 -0.25 -6 -8 -0.25 -3 -12.3 -0.25 -3
  [4,322,-8.8,-0.25,-6,-8.2,-0.25,-6,-8,-0.25,-3,-12.3,-0.25,-3],
// 4 322 -10 -0.25 -8.2 -8.8 -0.25 -6 -12.3 -0.25 -3 -12.3 -0.25 -8.2
  [4,322,-10,-0.25,-8.2,-8.8,-0.25,-6,-12.3,-0.25,-3,-12.3,-0.25,-8.2],
// 4 322 -6 -0.25 -2.3 -6.6 -0.25 -4.6 -5.8 -0.25 -4.6 -5.1 -0.25 -3
  [4,322,-6,-0.25,-2.3,-6.6,-0.25,-4.6,-5.8,-0.25,-4.6,-5.1,-0.25,-3],
// 4 322 -4.6 -0.25 -8.2 -5.1 -0.25 -3 -5.8 -0.25 -4.6 -5.4 -0.25 -9.5
  [4,322,-4.6,-0.25,-8.2,-5.1,-0.25,-3,-5.8,-0.25,-4.6,-5.4,-0.25,-9.5],
// 4 322 -3.9 -0.25 -3.2 -5.1 -0.25 -3 -4.6 -0.25 -8.2 -1.6 -0.25 -8.2
  [4,322,-3.9,-0.25,-3.2,-5.1,-0.25,-3,-4.6,-0.25,-8.2,-1.6,-0.25,-8.2],
// 3 322 -2.7 -0.25 -3 -3.9 -0.25 -3.2 -1.6 -0.25 -8.2
  [3,322,-2.7,-0.25,-3,-3.9,-0.25,-3.2,-1.6,-0.25,-8.2],
// 3 322 -1.8 -0.25 -2.3 -2.7 -0.25 -3 -1.6 -0.25 -8.2
  [3,322,-1.8,-0.25,-2.3,-2.7,-0.25,-3,-1.6,-0.25,-8.2],
// 4 322 13 -0.25 4 0.5 -0.25 4 9 -0.25 1.8 9.5 -0.25 1.8
  [4,322,13,-0.25,4,0.5,-0.25,4,9,-0.25,1.8,9.5,-0.25,1.8],
// 4 322 8.7 -0.25 1.6 9 -0.25 1.8 0.5 -0.25 4 5.5 -0.25 1.6
  [4,322,8.7,-0.25,1.6,9,-0.25,1.8,0.5,-0.25,4,5.5,-0.25,1.6],
// 3 322 0.5 -0.25 4 1.2 -0.25 1.6 5.5 -0.25 1.6
  [3,322,0.5,-0.25,4,1.2,-0.25,1.6,5.5,-0.25,1.6],
// 3 322 0.5 -0.25 4 1.2 -0.25 1 1.2 -0.25 1.6
  [3,322,0.5,-0.25,4,1.2,-0.25,1,1.2,-0.25,1.6],
// 3 322 0.5 -0.25 4 1.2 -0.25 -0.4 1.2 -0.25 1
  [3,322,0.5,-0.25,4,1.2,-0.25,-0.4,1.2,-0.25,1],
// 3 322 0.5 -0.25 4 1.2 -0.25 -1 1.2 -0.25 -0.4
  [3,322,0.5,-0.25,4,1.2,-0.25,-1,1.2,-0.25,-0.4],
// 3 322 0.5 -0.25 4 1.2 -0.25 -2.4 1.2 -0.25 -1
  [3,322,0.5,-0.25,4,1.2,-0.25,-2.4,1.2,-0.25,-1],
// 4 322 1.2 -0.25 -3 1.2 -0.25 -2.4 0.5 -0.25 4 0.5 -0.25 -12
  [4,322,1.2,-0.25,-3,1.2,-0.25,-2.4,0.5,-0.25,4,0.5,-0.25,-12],
// 3 322 1.2 -0.25 -3 0.5 -0.25 -12 1.2 -0.25 -8.2
  [3,322,1.2,-0.25,-3,0.5,-0.25,-12,1.2,-0.25,-8.2],
// 3 322 1.2 -0.25 -8.2 0.5 -0.25 -12 1.2 -0.25 -8.8
  [3,322,1.2,-0.25,-8.2,0.5,-0.25,-12,1.2,-0.25,-8.8],
// 4 322 4.2 -0.25 -8.8 1.2 -0.25 -8.8 0.5 -0.25 -12 5.6 -0.25 -9.9
  [4,322,4.2,-0.25,-8.8,1.2,-0.25,-8.8,0.5,-0.25,-12,5.6,-0.25,-9.9],
// 3 322 4.8 -0.25 -7.5 4.2 -0.25 -8.8 5.6 -0.25 -9.9
  [3,322,4.8,-0.25,-7.5,4.2,-0.25,-8.8,5.6,-0.25,-9.9],
// 4 322 6.3 -0.25 -9.9 5.6 -0.25 -9.9 0.5 -0.25 -12 7.5 -0.25 -11
  [4,322,6.3,-0.25,-9.9,5.6,-0.25,-9.9,0.5,-0.25,-12,7.5,-0.25,-11],
// 3 322 7 -0.25 -6.9 6.3 -0.25 -9.9 7.5 -0.25 -11
  [3,322,7,-0.25,-6.9,6.3,-0.25,-9.9,7.5,-0.25,-11],
// 4 322 7.5 -0.25 -11 0.5 -0.25 -12 13 -0.25 -12 8.3 -0.25 -11
  [4,322,7.5,-0.25,-11,0.5,-0.25,-12,13,-0.25,-12,8.3,-0.25,-11],
// 4 322 9.4 -0.25 -8.8 8.3 -0.25 -11 13 -0.25 -12 11.9 -0.25 -8.8
  [4,322,9.4,-0.25,-8.8,8.3,-0.25,-11,13,-0.25,-12,11.9,-0.25,-8.8],
// 3 322 11.9 -0.25 -8.2 11.9 -0.25 -8.8 13 -0.25 -12
  [3,322,11.9,-0.25,-8.2,11.9,-0.25,-8.8,13,-0.25,-12],
// 4 322 11.6 -0.25 -2.2 11.9 -0.25 -8.2 13 -0.25 -12 12 -0.25 -1.7
  [4,322,11.6,-0.25,-2.2,11.9,-0.25,-8.2,13,-0.25,-12,12,-0.25,-1.7],
// 4 322 12 -0.25 -1.7 13 -0.25 -12 13 -0.25 4 12 -0.25 -0.9
  [4,322,12,-0.25,-1.7,13,-0.25,-12,13,-0.25,4,12,-0.25,-0.9],
// 3 322 13 -0.25 4 12 -0.25 0.6 12 -0.25 -0.9
  [3,322,13,-0.25,4,12,-0.25,0.6,12,-0.25,-0.9],
// 3 322 13 -0.25 4 11.8 -0.25 1.3 12 -0.25 0.6
  [3,322,13,-0.25,4,11.8,-0.25,1.3,12,-0.25,0.6],
// 3 322 13 -0.25 4 11.2 -0.25 1.5 11.8 -0.25 1.3
  [3,322,13,-0.25,4,11.2,-0.25,1.5,11.8,-0.25,1.3],
// 4 322 10.8 -0.25 1.3 11.2 -0.25 1.5 13 -0.25 4 10 -0.25 1.3
  [4,322,10.8,-0.25,1.3,11.2,-0.25,1.5,13,-0.25,4,10,-0.25,1.3],
// 3 322 13 -0.25 4 9.5 -0.25 1.8 10 -0.25 1.3
  [3,322,13,-0.25,4,9.5,-0.25,1.8,10,-0.25,1.3],
// 4 322 10.6 -0.25 0.6 10.8 -0.25 1.3 10 -0.25 1.3 10 -0.25 0.3
  [4,322,10.6,-0.25,0.6,10.8,-0.25,1.3,10,-0.25,1.3,10,-0.25,0.3],
// 4 322 10.8 -0.25 0.1 10.6 -0.25 0.6 10 -0.25 0.3 10.3 -0.25 -0.5
  [4,322,10.8,-0.25,0.1,10.6,-0.25,0.6,10,-0.25,0.3,10.3,-0.25,-0.5],
// 4 322 11.3 -0.25 -0.1 10.8 -0.25 0.1 10.3 -0.25 -0.5 11.3 -0.25 -0.5
  [4,322,11.3,-0.25,-0.1,10.8,-0.25,0.1,10.3,-0.25,-0.5,11.3,-0.25,-0.5],
// 4 322 11.7 -0.25 0 11.3 -0.25 -0.1 11.3 -0.25 -0.5 12 -0.25 -0.9
  [4,322,11.7,-0.25,0,11.3,-0.25,-0.1,11.3,-0.25,-0.5,12,-0.25,-0.9],
// 3 322 12 -0.25 0.6 11.7 -0.25 0 12 -0.25 -0.9
  [3,322,12,-0.25,0.6,11.7,-0.25,0,12,-0.25,-0.9],
// 4 322 10.3 -0.25 -0.5 10 -0.25 0.3 9.7 -0.25 0 9.3 -0.25 -0.8
  [4,322,10.3,-0.25,-0.5,10,-0.25,0.3,9.7,-0.25,0,9.3,-0.25,-0.8],
// 4 322 9.3 -0.25 -0.8 9.7 -0.25 0 9.3 -0.25 0 8.6 -0.25 -0.1
  [4,322,9.3,-0.25,-0.8,9.7,-0.25,0,9.3,-0.25,0,8.6,-0.25,-0.1],
// 4 322 8.6 -0.25 -0.1 9.3 -0.25 0 8.7 -0.25 0.7 8.4 -0.25 0.4
  [4,322,8.6,-0.25,-0.1,9.3,-0.25,0,8.7,-0.25,0.7,8.4,-0.25,0.4],
// 4 322 8.4 -0.25 0.4 8.7 -0.25 0.7 8.7 -0.25 1.6 7.6 -0.25 0.7
  [4,322,8.4,-0.25,0.4,8.7,-0.25,0.7,8.7,-0.25,1.6,7.6,-0.25,0.7],
// 4 322 7.6 -0.25 0.7 8.7 -0.25 1.6 5.5 -0.25 1.6 7.1 -0.25 0.5
  [4,322,7.6,-0.25,0.7,8.7,-0.25,1.6,5.5,-0.25,1.6,7.1,-0.25,0.5],
// 4 322 7.1 -0.25 0.5 5.5 -0.25 1.6 5.5 -0.25 1 7 -0.25 0
  [4,322,7.1,-0.25,0.5,5.5,-0.25,1.6,5.5,-0.25,1,7,-0.25,0],
// 4 322 5.5 -0.25 -0.4 7 -0.25 0 5.5 -0.25 1 1.2 -0.25 -0.4
  [4,322,5.5,-0.25,-0.4,7,-0.25,0,5.5,-0.25,1,1.2,-0.25,-0.4],
// 3 322 5.5 -0.25 1 1.2 -0.25 1 1.2 -0.25 -0.4
  [3,322,5.5,-0.25,1,1.2,-0.25,1,1.2,-0.25,-0.4],
// 4 322 7.3 -0.25 -0.7 7 -0.25 0 5.5 -0.25 -0.4 5.5 -0.25 -1
  [4,322,7.3,-0.25,-0.7,7,-0.25,0,5.5,-0.25,-0.4,5.5,-0.25,-1],
// 4 322 7.3 -0.25 -0.7 5.5 -0.25 -1 6.9 -0.25 -1.3 7.6 -0.25 -1.3
  [4,322,7.3,-0.25,-0.7,5.5,-0.25,-1,6.9,-0.25,-1.3,7.6,-0.25,-1.3],
// 4 322 8 -0.25 -1 7.3 -0.25 -0.7 7.6 -0.25 -1.3 8.7 -0.25 -1.5
  [4,322,8,-0.25,-1,7.3,-0.25,-0.7,7.6,-0.25,-1.3,8.7,-0.25,-1.5],
// 4 322 8.6 -0.25 -0.8 8 -0.25 -1 8.7 -0.25 -1.5 9.3 -0.25 -0.8
  [4,322,8.6,-0.25,-0.8,8,-0.25,-1,8.7,-0.25,-1.5,9.3,-0.25,-0.8],
// 3 322 8.6 -0.25 -0.1 8.6 -0.25 -0.8 9.3 -0.25 -0.8
  [3,322,8.6,-0.25,-0.1,8.6,-0.25,-0.8,9.3,-0.25,-0.8],
// 3 322 7.6 -0.25 -1.3 8.1 -0.25 -1.7 8.7 -0.25 -1.5
  [3,322,7.6,-0.25,-1.3,8.1,-0.25,-1.7,8.7,-0.25,-1.5],
// 4 322 8.5 -0.25 -2.4 8.7 -0.25 -1.5 8.1 -0.25 -1.7 8.1 -0.25 -2.2
  [4,322,8.5,-0.25,-2.4,8.7,-0.25,-1.5,8.1,-0.25,-1.7,8.1,-0.25,-2.2],
// 4 322 8.7 -0.25 -3.2 8.5 -0.25 -2.4 8.1 -0.25 -2.2 7.7 -0.25 -2.5
  [4,322,8.7,-0.25,-3.2,8.5,-0.25,-2.4,8.1,-0.25,-2.2,7.7,-0.25,-2.5],
// 4 322 7.7 -0.25 -4.6 8.7 -0.25 -3.2 7.7 -0.25 -2.5 7 -0.25 -2.5
  [4,322,7.7,-0.25,-4.6,8.7,-0.25,-3.2,7.7,-0.25,-2.5,7,-0.25,-2.5],
// 4 322 9.4 -0.25 -3.3 8.7 -0.25 -3.2 7.7 -0.25 -4.6 8.9 -0.25 -8.2
  [4,322,9.4,-0.25,-3.3,8.7,-0.25,-3.2,7.7,-0.25,-4.6,8.9,-0.25,-8.2],
// 3 322 7.7 -0.25 -4.6 8.1 -0.25 -9.5 8.9 -0.25 -8.2
  [3,322,7.7,-0.25,-4.6,8.1,-0.25,-9.5,8.9,-0.25,-8.2],
// 4 322 9.4 -0.25 -3.3 8.9 -0.25 -8.2 11.9 -0.25 -8.2 10 -0.25 -2.9
  [4,322,9.4,-0.25,-3.3,8.9,-0.25,-8.2,11.9,-0.25,-8.2,10,-0.25,-2.9],
// 4 322 10 -0.25 -2.9 11.9 -0.25 -8.2 11.6 -0.25 -2.2 10.9 -0.25 -2.2
  [4,322,10,-0.25,-2.9,11.9,-0.25,-8.2,11.6,-0.25,-2.2,10.9,-0.25,-2.2],
// 3 322 10.9 -0.25 -2.2 10.4 -0.25 -2.4 10 -0.25 -2.9
  [3,322,10.9,-0.25,-2.2,10.4,-0.25,-2.4,10,-0.25,-2.9],
// 4 322 6.9 -0.25 -4.6 7.7 -0.25 -4.6 7 -0.25 -2.5 5.5 -0.25 -3
  [4,322,6.9,-0.25,-4.6,7.7,-0.25,-4.6,7,-0.25,-2.5,5.5,-0.25,-3],
// 4 322 5.5 -0.25 -3 7 -0.25 -2.5 6.5 -0.25 -2 5.5 -0.25 -2.4
  [4,322,5.5,-0.25,-3,7,-0.25,-2.5,6.5,-0.25,-2,5.5,-0.25,-2.4],
// 4 322 5.5 -0.25 -2.4 6.5 -0.25 -2 6.5 -0.25 -1.5 5.5 -0.25 -1
  [4,322,5.5,-0.25,-2.4,6.5,-0.25,-2,6.5,-0.25,-1.5,5.5,-0.25,-1],
// 3 322 5.5 -0.25 -1 6.5 -0.25 -1.5 6.9 -0.25 -1.3
  [3,322,5.5,-0.25,-1,6.5,-0.25,-1.5,6.9,-0.25,-1.3],
// 4 322 1.2 -0.25 -2.4 5.5 -0.25 -2.4 5.5 -0.25 -1 1.2 -0.25 -1
  [4,322,1.2,-0.25,-2.4,5.5,-0.25,-2.4,5.5,-0.25,-1,1.2,-0.25,-1],
// 4 322 5.9 -0.25 -7.9 6.9 -0.25 -4.6 5.5 -0.25 -3 5.3 -0.25 -6
  [4,322,5.9,-0.25,-7.9,6.9,-0.25,-4.6,5.5,-0.25,-3,5.3,-0.25,-6],
// 4 322 4.7 -0.25 -6 5.3 -0.25 -6 5.5 -0.25 -3 1.2 -0.25 -3
  [4,322,4.7,-0.25,-6,5.3,-0.25,-6,5.5,-0.25,-3,1.2,-0.25,-3],
// 4 322 3.5 -0.25 -8.2 4.7 -0.25 -6 1.2 -0.25 -3 1.2 -0.25 -8.2
  [4,322,3.5,-0.25,-8.2,4.7,-0.25,-6,1.2,-0.25,-3,1.2,-0.25,-8.2],
// 4 322 -14 -0.25 -13 -14 -0.25 13 -18 -0.25 14 -18 -0.25 -14
  [4,322,-14,-0.25,-13,-14,-0.25,13,-18,-0.25,14,-18,-0.25,-14],
// 4 322 14 -0.25 -13 -14 -0.25 -13 -18 -0.25 -14 18 -0.25 -14
  [4,322,14,-0.25,-13,-14,-0.25,-13,-18,-0.25,-14,18,-0.25,-14],
// 4 322 14 -0.25 13 14 -0.25 -13 18 -0.25 -14 18 -0.25 14
  [4,322,14,-0.25,13,14,-0.25,-13,18,-0.25,-14,18,-0.25,14],
// 4 322 -14 -0.25 13 14 -0.25 13 18 -0.25 14 -18 -0.25 14
  [4,322,-14,-0.25,13,14,-0.25,13,18,-0.25,14,-18,-0.25,14],
];
module ldraw_lib__4650852l(step=0, col=false, unit=2/5, alt=false, line=0.2, solid=!$preview)
    makepoly(ldraw_lib__4650852l(), step=step, col=col, unit=unit, alt=alt, line=line, solid=solid);
ldraw_lib__4650852l(line=0.2);
